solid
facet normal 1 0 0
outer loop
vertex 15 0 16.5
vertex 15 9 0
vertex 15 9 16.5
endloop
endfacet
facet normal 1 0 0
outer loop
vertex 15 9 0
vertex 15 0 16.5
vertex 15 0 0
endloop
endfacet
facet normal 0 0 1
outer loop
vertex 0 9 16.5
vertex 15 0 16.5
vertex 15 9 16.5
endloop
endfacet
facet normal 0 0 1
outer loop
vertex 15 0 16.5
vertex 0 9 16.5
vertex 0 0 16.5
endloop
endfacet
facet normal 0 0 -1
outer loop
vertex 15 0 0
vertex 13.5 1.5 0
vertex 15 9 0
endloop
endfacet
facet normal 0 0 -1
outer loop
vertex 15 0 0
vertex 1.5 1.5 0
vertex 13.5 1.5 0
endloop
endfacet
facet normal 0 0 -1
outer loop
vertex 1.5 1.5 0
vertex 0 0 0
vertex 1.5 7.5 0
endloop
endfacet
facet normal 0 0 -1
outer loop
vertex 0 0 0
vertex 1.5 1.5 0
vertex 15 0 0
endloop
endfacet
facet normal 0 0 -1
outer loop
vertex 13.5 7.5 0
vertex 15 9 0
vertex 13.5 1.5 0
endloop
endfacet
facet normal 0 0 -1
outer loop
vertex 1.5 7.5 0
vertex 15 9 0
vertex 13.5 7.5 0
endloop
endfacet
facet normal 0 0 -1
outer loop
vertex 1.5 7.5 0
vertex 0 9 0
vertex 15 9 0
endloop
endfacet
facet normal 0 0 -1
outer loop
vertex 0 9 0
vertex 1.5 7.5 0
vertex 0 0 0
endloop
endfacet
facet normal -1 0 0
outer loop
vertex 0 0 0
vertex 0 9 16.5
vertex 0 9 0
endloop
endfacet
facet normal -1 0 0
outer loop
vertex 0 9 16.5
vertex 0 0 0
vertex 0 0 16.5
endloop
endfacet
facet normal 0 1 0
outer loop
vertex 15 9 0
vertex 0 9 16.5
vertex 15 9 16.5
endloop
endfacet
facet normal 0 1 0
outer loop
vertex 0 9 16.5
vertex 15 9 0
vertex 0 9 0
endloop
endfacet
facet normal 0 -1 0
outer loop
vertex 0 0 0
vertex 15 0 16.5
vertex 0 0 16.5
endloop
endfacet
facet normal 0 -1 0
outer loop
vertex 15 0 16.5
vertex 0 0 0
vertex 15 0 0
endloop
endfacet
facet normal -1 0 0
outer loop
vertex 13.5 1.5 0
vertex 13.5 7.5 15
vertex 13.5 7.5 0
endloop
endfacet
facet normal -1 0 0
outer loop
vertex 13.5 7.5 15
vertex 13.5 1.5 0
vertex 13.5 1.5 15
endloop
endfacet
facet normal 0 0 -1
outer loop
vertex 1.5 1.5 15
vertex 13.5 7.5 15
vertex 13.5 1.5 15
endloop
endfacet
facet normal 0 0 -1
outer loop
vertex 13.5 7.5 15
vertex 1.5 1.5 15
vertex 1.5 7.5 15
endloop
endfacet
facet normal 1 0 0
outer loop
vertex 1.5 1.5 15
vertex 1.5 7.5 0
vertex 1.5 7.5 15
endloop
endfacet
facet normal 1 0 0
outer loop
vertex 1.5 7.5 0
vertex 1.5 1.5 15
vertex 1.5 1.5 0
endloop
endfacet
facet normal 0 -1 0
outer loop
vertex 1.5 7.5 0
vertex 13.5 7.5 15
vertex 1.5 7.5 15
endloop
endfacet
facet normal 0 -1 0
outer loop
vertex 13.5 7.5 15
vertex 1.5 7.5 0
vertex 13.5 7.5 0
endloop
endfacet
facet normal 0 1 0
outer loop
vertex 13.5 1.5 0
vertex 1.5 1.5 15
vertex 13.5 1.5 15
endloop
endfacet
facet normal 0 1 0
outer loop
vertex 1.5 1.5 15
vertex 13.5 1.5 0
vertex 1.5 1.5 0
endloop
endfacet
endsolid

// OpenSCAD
WALL_THICKNESS = 1.5;
LEDS_STRIP_THICKNESS = 6;
LED_STRIP_HEIGHT = 12;
COVER_SIZE = 15;

FIX_WIDTH = 8;

$fn = 30;

difference() {
    cube([LED_STRIP_HEIGHT + WALL_THICKNESS * 2, LEDS_STRIP_THICKNESS + WALL_THICKNESS * 2, COVER_SIZE + WALL_THICKNESS]);
    translate([WALL_THICKNESS, WALL_THICKNESS, 0]) cube([LED_STRIP_HEIGHT, LEDS_STRIP_THICKNESS, COVER_SIZE]);
    
}
